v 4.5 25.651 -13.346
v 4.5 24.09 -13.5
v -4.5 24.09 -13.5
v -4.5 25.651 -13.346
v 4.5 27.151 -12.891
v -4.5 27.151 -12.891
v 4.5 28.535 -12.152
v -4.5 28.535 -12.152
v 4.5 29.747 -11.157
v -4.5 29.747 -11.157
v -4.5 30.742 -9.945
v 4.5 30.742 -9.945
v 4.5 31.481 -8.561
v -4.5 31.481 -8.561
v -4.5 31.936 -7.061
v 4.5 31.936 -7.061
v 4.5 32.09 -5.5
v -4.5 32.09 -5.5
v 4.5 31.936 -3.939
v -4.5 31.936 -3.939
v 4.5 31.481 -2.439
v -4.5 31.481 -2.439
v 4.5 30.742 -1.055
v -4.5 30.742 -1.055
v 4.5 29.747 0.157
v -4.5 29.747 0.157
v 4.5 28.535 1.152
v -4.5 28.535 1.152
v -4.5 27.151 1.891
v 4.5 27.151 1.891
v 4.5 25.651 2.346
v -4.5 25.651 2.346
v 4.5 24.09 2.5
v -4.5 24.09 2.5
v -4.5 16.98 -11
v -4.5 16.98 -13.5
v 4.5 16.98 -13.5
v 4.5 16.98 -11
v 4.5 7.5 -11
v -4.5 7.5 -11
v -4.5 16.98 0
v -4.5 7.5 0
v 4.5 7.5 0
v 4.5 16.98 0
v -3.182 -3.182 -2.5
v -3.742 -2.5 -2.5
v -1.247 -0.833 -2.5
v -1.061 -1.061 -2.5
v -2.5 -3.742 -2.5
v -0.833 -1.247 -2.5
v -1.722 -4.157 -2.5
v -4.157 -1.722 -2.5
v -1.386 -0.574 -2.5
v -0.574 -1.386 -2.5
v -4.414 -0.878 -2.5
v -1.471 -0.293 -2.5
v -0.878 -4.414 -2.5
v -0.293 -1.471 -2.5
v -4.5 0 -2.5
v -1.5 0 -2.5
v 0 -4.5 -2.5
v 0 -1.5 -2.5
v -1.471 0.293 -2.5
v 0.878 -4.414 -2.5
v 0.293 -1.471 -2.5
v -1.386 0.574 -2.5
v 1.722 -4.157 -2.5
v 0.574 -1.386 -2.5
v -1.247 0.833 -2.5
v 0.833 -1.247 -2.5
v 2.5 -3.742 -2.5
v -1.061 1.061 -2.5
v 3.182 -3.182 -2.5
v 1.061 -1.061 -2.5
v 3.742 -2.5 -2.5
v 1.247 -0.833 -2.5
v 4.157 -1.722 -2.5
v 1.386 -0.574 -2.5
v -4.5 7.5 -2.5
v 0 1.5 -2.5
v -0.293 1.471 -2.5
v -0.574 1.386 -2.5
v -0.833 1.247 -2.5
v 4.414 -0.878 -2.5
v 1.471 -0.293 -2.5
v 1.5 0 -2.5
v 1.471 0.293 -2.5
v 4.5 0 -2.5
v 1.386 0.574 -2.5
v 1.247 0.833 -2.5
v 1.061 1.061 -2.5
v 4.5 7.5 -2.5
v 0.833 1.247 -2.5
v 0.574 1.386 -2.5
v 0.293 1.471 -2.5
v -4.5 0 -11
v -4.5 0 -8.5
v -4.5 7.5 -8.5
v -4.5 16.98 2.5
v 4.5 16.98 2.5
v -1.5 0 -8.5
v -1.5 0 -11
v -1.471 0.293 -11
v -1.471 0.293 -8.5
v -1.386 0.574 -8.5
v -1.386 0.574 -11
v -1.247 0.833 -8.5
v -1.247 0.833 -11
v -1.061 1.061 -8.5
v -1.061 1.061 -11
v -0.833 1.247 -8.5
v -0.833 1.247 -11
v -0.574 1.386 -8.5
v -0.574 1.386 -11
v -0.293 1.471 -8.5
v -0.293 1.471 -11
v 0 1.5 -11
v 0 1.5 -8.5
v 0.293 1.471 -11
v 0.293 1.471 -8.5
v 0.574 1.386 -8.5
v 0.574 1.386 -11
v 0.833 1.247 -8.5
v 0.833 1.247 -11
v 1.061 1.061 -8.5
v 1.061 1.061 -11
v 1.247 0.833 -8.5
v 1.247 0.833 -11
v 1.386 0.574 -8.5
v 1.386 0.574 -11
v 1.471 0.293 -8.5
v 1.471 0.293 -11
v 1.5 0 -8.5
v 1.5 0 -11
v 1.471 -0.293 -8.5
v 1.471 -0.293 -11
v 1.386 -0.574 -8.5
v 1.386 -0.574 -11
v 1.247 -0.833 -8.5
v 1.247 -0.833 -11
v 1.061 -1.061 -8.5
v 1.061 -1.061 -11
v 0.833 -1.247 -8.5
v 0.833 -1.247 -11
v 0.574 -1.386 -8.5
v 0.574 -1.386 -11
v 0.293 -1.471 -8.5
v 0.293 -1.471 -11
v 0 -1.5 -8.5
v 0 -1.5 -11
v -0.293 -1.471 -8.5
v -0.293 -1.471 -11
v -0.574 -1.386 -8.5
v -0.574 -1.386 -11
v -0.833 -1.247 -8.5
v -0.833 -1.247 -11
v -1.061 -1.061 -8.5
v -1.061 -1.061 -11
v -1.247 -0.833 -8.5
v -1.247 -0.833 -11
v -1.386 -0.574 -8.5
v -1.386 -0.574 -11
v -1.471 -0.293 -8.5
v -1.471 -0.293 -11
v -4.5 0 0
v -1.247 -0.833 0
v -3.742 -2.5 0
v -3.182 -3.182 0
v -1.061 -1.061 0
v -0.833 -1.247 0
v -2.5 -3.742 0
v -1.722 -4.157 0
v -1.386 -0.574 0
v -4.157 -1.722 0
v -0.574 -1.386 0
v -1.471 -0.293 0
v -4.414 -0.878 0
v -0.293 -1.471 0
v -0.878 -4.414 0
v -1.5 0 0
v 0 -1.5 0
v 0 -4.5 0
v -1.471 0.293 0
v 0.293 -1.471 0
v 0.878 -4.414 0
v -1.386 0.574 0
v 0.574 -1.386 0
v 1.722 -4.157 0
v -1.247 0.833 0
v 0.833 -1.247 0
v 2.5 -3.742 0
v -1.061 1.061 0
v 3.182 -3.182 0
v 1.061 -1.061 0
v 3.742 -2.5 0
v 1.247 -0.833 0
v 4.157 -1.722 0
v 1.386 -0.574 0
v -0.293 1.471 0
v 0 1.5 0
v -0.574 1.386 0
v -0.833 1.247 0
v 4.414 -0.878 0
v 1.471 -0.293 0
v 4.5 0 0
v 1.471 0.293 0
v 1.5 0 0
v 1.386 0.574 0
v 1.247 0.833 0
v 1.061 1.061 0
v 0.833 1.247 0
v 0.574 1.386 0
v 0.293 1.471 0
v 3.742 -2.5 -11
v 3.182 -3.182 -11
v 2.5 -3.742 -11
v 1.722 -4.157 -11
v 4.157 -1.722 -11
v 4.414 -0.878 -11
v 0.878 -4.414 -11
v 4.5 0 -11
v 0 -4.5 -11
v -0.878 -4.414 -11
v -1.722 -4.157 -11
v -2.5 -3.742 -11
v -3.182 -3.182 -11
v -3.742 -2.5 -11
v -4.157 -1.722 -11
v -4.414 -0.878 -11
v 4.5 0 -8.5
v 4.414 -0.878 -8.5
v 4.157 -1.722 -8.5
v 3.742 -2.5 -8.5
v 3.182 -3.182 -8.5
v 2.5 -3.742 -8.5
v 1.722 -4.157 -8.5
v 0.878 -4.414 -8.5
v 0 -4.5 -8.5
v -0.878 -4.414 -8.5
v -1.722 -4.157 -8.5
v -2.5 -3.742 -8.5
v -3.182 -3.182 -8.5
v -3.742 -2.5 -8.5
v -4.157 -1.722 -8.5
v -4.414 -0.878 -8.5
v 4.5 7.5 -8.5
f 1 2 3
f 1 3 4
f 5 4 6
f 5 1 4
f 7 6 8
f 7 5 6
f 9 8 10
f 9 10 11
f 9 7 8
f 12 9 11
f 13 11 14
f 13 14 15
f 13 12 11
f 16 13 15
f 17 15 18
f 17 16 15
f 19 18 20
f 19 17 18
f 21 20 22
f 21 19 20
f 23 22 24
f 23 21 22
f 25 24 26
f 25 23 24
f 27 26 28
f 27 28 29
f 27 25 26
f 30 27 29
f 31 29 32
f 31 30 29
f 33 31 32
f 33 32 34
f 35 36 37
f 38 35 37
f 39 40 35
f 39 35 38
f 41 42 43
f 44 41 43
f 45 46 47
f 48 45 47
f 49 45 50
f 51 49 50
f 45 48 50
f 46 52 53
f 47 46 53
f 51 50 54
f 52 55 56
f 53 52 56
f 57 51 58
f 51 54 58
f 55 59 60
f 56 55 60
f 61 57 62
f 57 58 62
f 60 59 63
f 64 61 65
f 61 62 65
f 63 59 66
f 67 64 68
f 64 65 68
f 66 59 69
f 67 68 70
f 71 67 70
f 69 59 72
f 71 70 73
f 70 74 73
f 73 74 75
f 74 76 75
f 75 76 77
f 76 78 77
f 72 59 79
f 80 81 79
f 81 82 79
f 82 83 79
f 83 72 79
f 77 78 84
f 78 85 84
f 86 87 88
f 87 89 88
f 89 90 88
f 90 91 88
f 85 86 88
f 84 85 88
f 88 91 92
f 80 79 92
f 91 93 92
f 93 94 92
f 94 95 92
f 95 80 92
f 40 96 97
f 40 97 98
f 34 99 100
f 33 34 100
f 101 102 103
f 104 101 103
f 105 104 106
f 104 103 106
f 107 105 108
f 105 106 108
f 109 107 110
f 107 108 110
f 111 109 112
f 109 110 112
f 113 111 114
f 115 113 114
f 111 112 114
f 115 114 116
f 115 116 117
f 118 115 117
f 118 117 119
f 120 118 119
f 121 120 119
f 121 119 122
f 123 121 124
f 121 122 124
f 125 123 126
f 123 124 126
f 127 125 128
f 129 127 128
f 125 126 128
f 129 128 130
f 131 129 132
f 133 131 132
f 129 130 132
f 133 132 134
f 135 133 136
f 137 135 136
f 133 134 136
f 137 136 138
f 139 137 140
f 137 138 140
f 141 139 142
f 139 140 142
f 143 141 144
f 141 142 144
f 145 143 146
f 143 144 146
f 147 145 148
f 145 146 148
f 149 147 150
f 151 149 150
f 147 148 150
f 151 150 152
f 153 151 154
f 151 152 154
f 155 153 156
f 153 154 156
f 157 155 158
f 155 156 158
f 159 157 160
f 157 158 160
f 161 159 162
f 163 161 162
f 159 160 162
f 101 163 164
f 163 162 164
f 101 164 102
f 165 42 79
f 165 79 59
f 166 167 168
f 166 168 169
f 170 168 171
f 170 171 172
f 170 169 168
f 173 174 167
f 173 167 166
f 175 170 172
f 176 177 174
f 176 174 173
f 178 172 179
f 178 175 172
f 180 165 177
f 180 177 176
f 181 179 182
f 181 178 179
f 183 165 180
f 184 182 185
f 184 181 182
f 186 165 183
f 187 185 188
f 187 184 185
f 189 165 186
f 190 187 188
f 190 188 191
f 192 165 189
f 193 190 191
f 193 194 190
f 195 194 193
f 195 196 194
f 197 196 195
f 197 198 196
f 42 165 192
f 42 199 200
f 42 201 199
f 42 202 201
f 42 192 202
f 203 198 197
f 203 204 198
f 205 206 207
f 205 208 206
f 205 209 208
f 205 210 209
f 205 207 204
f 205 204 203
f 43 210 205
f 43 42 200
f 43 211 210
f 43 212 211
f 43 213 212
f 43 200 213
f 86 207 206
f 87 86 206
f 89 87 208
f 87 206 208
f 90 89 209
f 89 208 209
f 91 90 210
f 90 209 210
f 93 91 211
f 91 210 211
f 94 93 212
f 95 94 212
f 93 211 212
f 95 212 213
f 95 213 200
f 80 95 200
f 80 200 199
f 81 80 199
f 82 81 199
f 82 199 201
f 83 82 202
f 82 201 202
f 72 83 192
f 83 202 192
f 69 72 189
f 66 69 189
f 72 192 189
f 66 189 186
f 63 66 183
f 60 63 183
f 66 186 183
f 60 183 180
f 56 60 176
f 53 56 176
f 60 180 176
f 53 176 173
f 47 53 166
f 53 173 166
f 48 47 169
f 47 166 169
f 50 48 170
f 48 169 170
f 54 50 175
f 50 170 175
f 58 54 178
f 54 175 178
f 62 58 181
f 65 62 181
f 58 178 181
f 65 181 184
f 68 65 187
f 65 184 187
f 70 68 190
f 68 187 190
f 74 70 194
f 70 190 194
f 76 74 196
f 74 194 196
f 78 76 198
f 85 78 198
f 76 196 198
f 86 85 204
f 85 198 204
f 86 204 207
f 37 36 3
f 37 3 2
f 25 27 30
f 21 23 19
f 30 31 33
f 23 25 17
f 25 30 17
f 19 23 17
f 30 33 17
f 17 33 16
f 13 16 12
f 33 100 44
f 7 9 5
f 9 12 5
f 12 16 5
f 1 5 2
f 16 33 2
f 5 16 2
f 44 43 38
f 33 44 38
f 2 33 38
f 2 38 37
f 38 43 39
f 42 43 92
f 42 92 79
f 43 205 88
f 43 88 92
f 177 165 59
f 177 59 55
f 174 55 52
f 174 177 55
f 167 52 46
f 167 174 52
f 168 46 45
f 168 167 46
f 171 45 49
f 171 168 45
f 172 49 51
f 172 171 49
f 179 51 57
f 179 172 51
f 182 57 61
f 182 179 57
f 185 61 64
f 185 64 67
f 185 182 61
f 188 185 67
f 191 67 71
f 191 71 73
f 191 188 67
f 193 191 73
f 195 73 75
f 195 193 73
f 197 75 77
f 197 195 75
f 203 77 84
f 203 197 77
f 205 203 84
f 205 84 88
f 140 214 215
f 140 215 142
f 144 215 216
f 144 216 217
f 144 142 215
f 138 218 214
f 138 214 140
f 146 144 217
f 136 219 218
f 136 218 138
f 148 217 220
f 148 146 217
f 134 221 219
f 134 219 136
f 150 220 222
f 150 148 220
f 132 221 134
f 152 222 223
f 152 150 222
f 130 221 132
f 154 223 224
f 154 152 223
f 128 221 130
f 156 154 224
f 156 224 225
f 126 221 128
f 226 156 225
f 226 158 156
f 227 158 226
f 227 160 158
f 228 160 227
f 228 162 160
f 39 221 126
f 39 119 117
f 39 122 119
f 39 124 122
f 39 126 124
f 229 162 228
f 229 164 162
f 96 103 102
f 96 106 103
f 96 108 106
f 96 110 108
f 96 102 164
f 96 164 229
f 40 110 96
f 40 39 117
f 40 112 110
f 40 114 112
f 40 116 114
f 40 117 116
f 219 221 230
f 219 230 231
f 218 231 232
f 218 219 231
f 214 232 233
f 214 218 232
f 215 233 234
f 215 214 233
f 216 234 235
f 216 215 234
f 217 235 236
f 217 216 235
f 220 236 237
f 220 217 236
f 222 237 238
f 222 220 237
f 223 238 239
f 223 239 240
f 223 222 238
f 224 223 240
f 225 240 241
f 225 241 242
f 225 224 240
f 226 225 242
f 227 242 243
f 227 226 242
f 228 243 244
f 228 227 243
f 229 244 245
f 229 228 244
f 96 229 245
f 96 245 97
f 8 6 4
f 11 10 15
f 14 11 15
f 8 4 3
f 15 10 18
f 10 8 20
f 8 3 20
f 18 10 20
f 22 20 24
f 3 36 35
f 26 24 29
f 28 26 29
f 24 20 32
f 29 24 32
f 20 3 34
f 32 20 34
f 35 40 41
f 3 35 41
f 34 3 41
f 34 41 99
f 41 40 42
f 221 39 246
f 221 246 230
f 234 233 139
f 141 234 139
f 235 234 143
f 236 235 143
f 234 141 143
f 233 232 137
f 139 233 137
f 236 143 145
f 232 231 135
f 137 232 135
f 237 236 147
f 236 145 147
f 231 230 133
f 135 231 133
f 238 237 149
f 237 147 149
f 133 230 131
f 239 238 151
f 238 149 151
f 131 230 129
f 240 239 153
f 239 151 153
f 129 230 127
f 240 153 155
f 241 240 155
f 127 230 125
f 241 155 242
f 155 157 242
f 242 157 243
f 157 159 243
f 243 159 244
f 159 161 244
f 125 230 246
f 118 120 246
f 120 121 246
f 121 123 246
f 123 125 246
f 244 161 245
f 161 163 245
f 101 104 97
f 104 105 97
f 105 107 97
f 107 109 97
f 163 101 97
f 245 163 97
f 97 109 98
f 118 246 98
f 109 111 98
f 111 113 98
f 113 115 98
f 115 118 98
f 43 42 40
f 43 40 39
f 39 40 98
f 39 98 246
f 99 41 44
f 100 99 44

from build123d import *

# Parameters (mm, degrees)
SKETCH1_R           = 4.5
SKETCH1_R_2         = 1.5
BOSS_EXTRUDE1_DEPTH = 2.5
SKETCH4_R           = 4.5
SKETCH4_R_2         = 1.5
BOSS_EXTRUDE2_DEPTH = 2.5
SKETCH5_W           = 9
SKETCH5_H           = 11
BOSS_EXTRUDE3_DEPTH = 9.48
SKETCH6_W           = 9
SKETCH6_H           = 2.5
SKETCH6_H_2         = 11
BOSS_EXTRUDE4_DEPTH = 7.11
SKETCH9_R           = 8
BOSS_EXTRUDE5_DEPTH = 9


with BuildPart() as part:
    # Sketch1 → Boss-Extrude1 (new body)
    # profile 1 of 2: a face of its own
    with BuildSketch(Plane.XY):
        Circle(SKETCH1_R)
        Circle(SKETCH1_R_2, mode=Mode.SUBTRACT)
    # profile 2 of 2: a face of its own
    with BuildSketch(Plane.XY):
        with BuildLine():
            Line((-4.5, 7.5), (-4.5, 0))
            ThreePointArc((-4.5, 0), (0, 4.5), (4.5, 0))
            Line((4.5, 0), (4.5, 7.5))
            Line((4.5, 7.5), (-4.5, 7.5))
        make_face()
    extrude(amount=-BOSS_EXTRUDE1_DEPTH)


with BuildPart() as body_2:
    # Sketch4 → Boss-Extrude2 (new body)
    # profile 1 of 2: a face of its own
    with BuildSketch(Plane(origin=(0, 0, -11), x_dir=(-1, 0, 0), z_dir=(0, 0, -1))):
        Circle(SKETCH4_R)
        Circle(SKETCH4_R_2, mode=Mode.SUBTRACT)
    # profile 2 of 2: a face of its own
    with BuildSketch(Plane(origin=(0, 0, -11), x_dir=(-1, 0, 0), z_dir=(0, 0, -1))):
        with BuildLine():
            Line((-4.5, 7.5), (-4.5, 0))
            ThreePointArc((-4.5, 0), (0, 4.5), (4.5, 0))
            Line((4.5, 0), (4.5, 7.5))
            Line((4.5, 7.5), (-4.5, 7.5))
        make_face()
    extrude(amount=-BOSS_EXTRUDE2_DEPTH)


with BuildPart() as body_3:
    # Sketch5 → Boss-Extrude3 (new body)
    with BuildSketch(Plane(origin=(0, 7.5, 0), x_dir=(1, 0, 0), z_dir=(0, 1, 0))):
        with Locations((0, 5.5)):
            Rectangle(SKETCH5_W, SKETCH5_H)
    extrude(amount=BOSS_EXTRUDE3_DEPTH)



with BuildPart() as body_4:
    # Sketch6 → Boss-Extrude4 (new body)
    with BuildSketch(Plane(origin=(0, 16.98, 0), x_dir=(1, 0, 0), z_dir=(0, 1, 0))):
        with Locations((0, 12.25)):
            Rectangle(SKETCH6_W, SKETCH6_H)
        with Locations((0, 5.5)):
            Rectangle(SKETCH6_W, SKETCH6_H_2)
        with Locations((0, -1.25)):
            Rectangle(SKETCH6_W, SKETCH6_H)
    extrude(amount=BOSS_EXTRUDE4_DEPTH)


with BuildPart() as body_3_1:
    add(body_3.part)

    add(body_4.part)  # Boss-Extrude5 merges body 4
    # Sketch9 → Boss-Extrude5 (add)
    with BuildSketch(Plane(origin=(4.5, 0, 0), x_dir=(0, 0, -1), z_dir=(1, 0, 0))):
        with Locations((5.5, 24.09)):
            Circle(SKETCH9_R)
    extrude(amount=-BOSS_EXTRUDE5_DEPTH)


solid = Compound([part.part, body_2.part, body_3_1.part])
